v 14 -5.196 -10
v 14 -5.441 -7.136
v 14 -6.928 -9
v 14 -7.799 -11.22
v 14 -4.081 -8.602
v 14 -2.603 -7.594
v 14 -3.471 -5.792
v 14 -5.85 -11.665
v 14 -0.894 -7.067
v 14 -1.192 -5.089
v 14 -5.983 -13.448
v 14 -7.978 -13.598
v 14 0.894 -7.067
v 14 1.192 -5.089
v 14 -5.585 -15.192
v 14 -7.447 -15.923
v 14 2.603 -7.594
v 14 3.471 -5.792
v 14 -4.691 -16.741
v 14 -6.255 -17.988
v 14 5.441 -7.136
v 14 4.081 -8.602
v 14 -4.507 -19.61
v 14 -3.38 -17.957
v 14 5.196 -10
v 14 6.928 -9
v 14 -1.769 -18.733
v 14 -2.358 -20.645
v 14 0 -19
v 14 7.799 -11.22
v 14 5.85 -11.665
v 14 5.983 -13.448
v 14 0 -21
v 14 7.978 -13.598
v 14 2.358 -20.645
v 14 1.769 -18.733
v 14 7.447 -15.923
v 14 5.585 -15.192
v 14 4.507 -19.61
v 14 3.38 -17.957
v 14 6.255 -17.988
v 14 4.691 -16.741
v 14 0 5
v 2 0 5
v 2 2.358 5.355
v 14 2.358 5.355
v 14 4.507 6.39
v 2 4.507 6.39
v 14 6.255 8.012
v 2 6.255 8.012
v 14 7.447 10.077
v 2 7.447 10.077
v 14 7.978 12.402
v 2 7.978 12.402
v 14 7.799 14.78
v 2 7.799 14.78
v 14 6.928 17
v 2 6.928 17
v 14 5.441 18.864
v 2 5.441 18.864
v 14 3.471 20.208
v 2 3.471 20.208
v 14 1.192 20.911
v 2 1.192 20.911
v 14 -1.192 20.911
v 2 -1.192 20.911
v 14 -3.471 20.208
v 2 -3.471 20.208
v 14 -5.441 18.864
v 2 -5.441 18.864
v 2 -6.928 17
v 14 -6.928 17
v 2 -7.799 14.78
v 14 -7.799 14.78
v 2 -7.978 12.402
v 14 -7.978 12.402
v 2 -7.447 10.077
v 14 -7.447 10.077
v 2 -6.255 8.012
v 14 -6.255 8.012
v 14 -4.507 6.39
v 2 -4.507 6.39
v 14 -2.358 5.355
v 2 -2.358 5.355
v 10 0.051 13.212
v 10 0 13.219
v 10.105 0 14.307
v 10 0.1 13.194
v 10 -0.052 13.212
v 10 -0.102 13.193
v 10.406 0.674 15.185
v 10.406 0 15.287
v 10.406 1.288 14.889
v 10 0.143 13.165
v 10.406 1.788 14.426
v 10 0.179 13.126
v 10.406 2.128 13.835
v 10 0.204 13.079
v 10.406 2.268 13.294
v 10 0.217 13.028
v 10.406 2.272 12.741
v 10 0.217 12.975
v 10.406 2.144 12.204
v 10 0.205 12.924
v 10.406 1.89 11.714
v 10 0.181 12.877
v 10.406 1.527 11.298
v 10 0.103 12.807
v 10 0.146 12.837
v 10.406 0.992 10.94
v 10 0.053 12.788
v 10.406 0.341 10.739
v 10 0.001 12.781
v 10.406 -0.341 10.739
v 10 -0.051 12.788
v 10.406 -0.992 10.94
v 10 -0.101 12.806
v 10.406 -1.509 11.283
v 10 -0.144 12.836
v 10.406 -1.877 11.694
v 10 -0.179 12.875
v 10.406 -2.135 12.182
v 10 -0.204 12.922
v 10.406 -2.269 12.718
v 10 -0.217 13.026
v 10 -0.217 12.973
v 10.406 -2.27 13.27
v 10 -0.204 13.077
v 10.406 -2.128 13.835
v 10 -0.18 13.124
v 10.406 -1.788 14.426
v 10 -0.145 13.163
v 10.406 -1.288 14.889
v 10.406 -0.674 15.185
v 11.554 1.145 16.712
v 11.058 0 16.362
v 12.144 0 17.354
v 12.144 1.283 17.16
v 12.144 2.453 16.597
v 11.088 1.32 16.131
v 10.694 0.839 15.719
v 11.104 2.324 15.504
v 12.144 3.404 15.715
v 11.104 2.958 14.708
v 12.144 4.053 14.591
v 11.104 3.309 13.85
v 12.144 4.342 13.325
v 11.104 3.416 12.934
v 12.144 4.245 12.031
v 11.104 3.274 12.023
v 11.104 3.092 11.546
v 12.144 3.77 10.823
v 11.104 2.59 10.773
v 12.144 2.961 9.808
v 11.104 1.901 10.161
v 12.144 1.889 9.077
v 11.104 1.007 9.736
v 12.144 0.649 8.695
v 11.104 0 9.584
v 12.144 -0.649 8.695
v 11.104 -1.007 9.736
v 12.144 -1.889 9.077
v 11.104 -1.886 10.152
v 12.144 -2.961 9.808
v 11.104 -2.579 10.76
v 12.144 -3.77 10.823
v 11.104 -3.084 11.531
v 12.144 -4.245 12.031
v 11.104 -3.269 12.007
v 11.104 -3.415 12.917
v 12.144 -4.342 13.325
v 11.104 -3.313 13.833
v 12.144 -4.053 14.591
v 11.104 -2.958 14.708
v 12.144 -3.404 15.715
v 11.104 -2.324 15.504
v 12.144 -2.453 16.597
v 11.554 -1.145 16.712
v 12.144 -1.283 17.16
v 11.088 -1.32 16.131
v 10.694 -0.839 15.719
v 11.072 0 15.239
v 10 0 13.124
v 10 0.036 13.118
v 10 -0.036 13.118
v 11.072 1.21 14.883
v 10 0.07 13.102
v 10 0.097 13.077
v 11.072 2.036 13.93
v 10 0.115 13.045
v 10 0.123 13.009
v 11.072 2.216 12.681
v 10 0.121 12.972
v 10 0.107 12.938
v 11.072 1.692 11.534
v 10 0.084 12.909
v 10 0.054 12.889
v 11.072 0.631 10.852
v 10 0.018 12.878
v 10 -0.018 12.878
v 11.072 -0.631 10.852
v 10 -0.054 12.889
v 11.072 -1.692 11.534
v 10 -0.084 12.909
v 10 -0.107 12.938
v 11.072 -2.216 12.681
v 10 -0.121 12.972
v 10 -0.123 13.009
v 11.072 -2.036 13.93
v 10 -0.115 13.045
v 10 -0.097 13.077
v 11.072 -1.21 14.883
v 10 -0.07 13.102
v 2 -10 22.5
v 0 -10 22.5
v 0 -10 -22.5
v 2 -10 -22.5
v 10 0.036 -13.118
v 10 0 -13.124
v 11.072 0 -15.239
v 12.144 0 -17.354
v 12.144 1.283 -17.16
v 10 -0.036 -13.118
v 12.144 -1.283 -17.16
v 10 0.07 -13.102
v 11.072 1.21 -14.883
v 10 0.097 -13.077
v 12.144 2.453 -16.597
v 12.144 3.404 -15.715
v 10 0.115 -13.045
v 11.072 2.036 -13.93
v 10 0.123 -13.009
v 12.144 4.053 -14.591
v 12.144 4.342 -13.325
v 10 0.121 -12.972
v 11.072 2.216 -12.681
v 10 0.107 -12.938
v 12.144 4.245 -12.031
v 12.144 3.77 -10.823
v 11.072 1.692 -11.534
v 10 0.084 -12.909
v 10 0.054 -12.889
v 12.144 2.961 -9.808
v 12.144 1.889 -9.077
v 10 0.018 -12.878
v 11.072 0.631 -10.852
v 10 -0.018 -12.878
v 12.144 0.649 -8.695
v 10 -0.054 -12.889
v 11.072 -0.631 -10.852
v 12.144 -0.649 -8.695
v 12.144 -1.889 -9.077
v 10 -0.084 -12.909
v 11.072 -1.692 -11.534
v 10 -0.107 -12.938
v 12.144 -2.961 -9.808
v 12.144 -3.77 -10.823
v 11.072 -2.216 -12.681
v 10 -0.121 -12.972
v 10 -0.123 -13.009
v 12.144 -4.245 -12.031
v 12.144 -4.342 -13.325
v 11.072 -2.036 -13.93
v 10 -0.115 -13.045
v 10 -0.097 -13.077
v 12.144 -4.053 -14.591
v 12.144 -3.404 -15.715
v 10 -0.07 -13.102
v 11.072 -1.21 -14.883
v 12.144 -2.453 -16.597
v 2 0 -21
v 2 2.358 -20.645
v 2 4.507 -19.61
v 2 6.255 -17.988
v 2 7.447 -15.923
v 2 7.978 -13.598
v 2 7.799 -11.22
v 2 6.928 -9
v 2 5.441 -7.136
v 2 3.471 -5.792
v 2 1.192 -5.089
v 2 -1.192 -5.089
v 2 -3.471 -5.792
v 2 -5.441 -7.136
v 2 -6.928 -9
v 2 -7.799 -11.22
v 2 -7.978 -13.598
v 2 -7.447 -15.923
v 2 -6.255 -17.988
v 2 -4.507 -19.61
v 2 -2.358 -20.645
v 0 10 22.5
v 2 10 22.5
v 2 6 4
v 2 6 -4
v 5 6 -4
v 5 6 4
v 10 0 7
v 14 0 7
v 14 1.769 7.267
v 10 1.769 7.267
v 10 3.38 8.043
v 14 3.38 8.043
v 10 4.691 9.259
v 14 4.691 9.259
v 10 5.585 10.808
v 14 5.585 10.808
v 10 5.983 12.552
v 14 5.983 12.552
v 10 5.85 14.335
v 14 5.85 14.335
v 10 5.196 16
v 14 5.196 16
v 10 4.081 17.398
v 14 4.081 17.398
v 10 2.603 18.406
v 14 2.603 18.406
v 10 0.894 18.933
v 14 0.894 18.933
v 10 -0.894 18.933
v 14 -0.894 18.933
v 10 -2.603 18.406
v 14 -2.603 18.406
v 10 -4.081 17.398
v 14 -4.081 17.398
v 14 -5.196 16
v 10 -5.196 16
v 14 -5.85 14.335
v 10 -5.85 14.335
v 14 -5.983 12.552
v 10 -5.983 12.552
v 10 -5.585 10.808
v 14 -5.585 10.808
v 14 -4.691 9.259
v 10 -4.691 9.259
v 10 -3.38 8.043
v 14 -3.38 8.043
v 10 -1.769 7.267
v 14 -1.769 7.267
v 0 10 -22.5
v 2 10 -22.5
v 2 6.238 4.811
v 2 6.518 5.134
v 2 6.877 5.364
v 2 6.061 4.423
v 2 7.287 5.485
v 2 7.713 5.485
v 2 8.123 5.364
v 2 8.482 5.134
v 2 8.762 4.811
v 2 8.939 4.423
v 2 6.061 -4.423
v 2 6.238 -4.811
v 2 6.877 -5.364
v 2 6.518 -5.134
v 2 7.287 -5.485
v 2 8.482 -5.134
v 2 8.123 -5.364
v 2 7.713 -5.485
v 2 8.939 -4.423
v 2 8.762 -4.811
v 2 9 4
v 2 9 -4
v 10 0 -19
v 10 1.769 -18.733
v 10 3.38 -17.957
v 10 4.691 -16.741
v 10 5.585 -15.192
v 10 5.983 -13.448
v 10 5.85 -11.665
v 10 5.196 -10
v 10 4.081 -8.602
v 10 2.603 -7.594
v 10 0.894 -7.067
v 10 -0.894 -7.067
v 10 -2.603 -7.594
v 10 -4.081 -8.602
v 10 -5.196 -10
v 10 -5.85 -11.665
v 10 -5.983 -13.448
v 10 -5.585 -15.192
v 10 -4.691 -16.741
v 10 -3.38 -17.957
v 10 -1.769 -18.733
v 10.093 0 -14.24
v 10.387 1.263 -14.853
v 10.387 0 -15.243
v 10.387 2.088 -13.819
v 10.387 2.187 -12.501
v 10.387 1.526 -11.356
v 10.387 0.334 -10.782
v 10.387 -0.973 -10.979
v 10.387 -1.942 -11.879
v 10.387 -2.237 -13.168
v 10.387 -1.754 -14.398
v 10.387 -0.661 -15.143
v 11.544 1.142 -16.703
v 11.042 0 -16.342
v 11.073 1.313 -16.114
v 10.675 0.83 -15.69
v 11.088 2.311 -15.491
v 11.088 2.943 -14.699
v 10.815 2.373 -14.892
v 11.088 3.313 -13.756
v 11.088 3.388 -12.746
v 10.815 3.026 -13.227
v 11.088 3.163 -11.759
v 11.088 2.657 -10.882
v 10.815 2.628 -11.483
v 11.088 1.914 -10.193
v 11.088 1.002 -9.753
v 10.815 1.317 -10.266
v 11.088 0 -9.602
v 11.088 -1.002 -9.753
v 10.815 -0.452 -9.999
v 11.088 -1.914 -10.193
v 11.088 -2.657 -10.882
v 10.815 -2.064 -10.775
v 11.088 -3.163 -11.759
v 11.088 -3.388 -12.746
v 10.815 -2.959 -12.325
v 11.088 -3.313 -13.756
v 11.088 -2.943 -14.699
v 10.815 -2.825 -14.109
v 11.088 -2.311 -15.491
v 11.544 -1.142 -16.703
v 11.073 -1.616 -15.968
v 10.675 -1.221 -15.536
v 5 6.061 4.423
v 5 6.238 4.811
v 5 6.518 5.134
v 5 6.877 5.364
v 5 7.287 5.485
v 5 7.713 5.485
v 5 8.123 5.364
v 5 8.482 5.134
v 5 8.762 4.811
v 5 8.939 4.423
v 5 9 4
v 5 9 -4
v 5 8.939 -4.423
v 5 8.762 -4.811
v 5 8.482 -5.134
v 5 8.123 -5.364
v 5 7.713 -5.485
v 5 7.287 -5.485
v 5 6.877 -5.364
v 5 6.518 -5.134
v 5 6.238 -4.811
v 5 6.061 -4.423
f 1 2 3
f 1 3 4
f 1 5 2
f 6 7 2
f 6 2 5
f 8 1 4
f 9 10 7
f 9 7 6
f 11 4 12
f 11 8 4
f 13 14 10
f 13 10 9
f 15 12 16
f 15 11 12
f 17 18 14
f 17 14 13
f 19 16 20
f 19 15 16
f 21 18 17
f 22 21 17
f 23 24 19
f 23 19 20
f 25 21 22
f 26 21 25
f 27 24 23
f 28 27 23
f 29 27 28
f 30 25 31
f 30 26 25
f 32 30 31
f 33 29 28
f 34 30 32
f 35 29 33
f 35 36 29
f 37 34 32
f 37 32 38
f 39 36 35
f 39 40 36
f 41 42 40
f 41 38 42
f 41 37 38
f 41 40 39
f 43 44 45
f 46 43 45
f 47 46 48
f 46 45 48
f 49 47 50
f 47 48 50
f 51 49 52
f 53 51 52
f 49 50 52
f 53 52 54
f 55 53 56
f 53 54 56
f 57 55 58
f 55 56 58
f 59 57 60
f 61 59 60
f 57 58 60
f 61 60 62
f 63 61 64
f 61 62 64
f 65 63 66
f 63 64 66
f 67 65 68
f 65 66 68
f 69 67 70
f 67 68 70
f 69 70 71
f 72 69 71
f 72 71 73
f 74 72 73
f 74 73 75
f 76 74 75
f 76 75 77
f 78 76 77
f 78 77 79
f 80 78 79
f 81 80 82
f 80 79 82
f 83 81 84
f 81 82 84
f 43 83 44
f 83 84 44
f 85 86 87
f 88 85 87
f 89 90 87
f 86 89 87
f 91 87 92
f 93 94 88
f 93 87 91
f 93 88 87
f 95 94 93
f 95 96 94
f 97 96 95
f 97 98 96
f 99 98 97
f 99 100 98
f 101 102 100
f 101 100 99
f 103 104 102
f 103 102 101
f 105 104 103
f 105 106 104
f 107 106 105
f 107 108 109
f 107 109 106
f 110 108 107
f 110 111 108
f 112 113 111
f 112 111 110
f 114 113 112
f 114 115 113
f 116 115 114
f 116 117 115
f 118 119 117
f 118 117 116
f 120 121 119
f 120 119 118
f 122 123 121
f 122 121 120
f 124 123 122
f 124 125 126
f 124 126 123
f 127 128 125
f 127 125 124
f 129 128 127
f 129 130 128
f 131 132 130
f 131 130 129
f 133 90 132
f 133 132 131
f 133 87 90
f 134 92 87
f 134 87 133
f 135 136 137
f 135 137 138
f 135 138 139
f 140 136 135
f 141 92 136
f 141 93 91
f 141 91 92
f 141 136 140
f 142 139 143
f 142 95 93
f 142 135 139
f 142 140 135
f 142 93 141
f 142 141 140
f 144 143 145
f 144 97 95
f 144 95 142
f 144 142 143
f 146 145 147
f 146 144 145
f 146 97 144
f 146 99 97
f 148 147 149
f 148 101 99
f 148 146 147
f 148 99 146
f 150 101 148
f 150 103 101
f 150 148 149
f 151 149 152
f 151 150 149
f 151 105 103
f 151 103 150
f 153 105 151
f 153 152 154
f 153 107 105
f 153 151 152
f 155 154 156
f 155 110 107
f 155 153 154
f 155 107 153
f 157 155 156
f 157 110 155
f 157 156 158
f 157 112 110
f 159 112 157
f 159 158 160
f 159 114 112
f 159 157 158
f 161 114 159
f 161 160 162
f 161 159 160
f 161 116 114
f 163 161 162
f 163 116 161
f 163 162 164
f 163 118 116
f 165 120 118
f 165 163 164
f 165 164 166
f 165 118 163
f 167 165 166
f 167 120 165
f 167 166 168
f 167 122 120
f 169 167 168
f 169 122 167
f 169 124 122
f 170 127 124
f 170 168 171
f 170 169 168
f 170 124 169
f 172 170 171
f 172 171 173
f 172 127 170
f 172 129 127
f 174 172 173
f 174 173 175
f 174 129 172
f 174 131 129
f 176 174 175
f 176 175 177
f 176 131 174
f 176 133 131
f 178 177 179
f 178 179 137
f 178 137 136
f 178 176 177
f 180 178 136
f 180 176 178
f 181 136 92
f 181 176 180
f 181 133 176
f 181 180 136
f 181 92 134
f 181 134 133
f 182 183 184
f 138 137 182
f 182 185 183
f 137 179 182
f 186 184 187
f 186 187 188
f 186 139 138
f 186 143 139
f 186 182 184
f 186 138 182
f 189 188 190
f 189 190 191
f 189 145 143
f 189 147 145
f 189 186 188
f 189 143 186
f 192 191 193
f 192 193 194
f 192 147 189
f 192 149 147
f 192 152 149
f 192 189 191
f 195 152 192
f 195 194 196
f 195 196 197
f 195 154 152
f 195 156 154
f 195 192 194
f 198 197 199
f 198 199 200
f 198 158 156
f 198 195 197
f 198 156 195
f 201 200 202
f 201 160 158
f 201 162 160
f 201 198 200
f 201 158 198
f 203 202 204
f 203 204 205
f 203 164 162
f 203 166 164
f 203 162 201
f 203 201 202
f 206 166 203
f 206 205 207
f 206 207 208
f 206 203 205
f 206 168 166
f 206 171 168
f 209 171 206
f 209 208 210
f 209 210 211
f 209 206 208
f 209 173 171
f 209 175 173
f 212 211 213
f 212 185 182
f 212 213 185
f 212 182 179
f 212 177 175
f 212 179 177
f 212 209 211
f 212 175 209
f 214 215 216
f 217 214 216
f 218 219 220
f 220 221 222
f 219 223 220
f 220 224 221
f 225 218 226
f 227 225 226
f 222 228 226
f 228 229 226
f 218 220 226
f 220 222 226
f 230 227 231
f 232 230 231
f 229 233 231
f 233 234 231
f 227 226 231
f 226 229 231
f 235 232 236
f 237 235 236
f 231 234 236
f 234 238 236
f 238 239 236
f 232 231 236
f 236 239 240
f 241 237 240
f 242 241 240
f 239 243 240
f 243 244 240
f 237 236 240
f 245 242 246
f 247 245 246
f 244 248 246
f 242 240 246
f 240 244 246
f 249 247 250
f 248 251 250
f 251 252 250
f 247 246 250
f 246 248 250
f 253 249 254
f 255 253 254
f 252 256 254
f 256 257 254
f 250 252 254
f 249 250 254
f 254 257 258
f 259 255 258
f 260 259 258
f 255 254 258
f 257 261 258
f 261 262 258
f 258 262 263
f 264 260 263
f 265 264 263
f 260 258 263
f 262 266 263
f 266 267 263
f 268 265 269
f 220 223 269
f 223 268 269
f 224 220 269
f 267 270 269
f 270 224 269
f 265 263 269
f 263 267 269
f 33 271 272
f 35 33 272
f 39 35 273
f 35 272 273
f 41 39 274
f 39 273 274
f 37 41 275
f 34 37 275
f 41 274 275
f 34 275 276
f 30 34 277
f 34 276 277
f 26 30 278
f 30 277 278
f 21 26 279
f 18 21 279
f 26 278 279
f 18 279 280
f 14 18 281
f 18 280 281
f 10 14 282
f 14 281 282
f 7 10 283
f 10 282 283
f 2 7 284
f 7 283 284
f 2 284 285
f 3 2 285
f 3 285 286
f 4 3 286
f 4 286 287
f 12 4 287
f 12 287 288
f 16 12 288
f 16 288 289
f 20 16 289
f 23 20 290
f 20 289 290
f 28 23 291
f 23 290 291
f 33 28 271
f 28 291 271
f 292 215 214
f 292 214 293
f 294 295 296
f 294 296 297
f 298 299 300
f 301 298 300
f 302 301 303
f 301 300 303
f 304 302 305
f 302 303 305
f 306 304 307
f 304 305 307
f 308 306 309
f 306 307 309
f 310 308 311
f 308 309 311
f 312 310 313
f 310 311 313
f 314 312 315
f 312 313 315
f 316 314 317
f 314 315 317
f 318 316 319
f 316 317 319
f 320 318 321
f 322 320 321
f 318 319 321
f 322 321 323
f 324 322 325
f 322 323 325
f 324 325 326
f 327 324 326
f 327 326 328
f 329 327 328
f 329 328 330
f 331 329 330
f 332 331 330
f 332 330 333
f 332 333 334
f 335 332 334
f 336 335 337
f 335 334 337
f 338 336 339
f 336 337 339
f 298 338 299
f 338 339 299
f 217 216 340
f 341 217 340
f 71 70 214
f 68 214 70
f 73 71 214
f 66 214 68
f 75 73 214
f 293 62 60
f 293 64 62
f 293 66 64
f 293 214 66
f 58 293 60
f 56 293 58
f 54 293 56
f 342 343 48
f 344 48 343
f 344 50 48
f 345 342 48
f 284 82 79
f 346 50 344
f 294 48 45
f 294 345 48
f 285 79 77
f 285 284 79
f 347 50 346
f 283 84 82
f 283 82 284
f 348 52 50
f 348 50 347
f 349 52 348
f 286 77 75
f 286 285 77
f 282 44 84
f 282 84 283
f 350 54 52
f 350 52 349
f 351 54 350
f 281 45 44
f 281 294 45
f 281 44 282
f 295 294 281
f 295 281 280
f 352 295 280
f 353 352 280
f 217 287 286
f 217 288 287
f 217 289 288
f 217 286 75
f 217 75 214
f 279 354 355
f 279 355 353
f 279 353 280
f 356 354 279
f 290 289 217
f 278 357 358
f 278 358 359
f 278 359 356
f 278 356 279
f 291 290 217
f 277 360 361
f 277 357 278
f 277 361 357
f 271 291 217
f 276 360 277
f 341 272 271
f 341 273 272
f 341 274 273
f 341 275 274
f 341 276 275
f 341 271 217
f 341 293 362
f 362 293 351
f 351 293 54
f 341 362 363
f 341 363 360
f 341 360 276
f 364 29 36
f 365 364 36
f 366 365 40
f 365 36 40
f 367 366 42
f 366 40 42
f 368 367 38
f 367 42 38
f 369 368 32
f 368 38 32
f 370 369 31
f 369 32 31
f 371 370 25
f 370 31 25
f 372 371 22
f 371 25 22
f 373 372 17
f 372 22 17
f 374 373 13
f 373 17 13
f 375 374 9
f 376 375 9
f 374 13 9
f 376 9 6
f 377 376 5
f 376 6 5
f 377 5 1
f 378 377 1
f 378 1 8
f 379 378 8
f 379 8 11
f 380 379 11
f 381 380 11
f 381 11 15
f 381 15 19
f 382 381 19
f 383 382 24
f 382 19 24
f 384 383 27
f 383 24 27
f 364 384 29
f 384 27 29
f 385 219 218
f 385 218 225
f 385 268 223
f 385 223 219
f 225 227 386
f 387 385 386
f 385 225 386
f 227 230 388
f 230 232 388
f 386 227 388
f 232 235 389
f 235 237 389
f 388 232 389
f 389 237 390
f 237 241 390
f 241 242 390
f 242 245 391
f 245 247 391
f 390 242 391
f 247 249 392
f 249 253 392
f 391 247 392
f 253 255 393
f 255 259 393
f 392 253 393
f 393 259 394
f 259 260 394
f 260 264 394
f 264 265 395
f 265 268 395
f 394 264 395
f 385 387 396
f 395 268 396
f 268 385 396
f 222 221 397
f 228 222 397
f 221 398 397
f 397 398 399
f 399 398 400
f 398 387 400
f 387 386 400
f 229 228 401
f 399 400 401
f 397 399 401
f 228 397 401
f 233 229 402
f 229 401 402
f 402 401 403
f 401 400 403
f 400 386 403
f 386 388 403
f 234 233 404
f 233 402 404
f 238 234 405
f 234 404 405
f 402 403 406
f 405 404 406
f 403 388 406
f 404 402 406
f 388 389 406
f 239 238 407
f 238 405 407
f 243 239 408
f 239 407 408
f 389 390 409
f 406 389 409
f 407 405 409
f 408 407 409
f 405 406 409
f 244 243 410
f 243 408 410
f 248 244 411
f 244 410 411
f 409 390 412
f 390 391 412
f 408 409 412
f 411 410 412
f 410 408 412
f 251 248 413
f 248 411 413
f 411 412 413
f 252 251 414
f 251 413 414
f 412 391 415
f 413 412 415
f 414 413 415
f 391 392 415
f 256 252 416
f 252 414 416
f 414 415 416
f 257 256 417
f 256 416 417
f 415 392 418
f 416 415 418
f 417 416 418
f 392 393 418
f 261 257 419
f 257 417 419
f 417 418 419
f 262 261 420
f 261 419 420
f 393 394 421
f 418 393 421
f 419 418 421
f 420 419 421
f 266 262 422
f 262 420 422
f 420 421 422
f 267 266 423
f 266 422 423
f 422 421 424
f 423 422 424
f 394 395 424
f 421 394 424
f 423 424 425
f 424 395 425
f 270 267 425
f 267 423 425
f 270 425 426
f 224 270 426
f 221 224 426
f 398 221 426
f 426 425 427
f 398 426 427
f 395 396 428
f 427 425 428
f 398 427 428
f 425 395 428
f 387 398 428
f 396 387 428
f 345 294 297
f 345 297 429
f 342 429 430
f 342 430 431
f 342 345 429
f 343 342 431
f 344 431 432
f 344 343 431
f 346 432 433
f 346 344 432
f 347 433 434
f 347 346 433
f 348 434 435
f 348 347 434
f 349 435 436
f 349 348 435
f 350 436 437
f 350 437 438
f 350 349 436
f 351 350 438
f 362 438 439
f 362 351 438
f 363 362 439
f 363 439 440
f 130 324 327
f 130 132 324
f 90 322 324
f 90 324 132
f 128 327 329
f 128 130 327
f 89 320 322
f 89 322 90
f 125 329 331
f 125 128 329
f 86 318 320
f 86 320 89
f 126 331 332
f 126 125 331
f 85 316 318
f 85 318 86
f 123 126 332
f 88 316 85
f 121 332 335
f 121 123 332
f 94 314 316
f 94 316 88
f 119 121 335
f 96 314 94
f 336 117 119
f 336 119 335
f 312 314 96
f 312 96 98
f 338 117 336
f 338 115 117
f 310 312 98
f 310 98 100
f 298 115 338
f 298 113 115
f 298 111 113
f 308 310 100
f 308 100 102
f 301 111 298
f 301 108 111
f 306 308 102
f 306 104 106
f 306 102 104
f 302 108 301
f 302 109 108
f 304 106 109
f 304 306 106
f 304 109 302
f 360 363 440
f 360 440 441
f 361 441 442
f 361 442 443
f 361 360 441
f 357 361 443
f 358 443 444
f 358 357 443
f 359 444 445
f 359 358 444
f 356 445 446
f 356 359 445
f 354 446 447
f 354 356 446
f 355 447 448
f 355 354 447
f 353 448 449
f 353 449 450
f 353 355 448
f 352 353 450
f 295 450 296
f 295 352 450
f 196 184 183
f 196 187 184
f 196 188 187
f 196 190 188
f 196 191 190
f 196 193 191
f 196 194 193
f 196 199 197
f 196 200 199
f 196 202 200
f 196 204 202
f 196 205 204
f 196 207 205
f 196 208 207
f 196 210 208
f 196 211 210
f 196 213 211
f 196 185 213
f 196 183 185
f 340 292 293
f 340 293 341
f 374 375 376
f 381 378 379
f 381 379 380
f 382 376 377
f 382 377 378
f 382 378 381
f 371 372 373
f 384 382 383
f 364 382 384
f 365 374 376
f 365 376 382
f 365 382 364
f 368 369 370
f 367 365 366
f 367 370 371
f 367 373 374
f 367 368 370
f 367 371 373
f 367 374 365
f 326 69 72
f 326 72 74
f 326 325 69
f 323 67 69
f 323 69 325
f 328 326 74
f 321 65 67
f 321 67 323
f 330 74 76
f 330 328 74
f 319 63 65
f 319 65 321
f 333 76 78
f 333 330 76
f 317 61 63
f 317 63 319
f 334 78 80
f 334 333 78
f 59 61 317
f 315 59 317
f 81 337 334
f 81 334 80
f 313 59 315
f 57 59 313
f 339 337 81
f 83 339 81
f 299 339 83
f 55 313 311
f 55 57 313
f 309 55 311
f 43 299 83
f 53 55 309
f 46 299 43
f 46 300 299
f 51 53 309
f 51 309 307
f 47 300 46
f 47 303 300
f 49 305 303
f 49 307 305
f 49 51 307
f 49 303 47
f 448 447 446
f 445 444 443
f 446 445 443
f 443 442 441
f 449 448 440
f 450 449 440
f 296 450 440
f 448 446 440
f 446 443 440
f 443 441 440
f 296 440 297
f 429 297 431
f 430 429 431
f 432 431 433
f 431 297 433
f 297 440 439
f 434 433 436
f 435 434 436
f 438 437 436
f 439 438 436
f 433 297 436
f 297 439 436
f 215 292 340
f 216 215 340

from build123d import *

# Parameters (mm, degrees)
SKETCH_1_W          = 45
SKETCH_1_H          = 20
EXTRUDE_1_DEPTH     = 2
EXTRUDE_2_DEPTH     = 3
SKETCH_3_R          = 8
EXTRUDE_3_DEPTH     = 12
SKETCH_4_R          = 6
CUT_EXTRUDE_1_DEPTH = 4


with BuildPart() as part:
    # 草图1 → 凸台-拉伸1 (new body)
    with BuildSketch(Plane(origin=(0, 0, 0), x_dir=(0, 0, -1), z_dir=(1, 0, 0))):
        Rectangle(SKETCH_1_W, SKETCH_1_H)
    extrude(amount=EXTRUDE_1_DEPTH)

    # 草图2 → 凸台-拉伸2 (add)
    with BuildSketch(Plane(origin=(2, 0, 0), x_dir=(0, 0, -1), z_dir=(1, 0, 0))):
        with BuildLine():
            Line((-4, 9), (4, 9))
            ThreePointArc((4, 9), (5.5, 7.5), (4, 6))
            Line((4, 6), (-4, 6))
            ThreePointArc((-4, 6), (-5.5, 7.5), (-4, 9))
        make_face()
    extrude(amount=EXTRUDE_2_DEPTH)

    # 草图3 → 凸台-拉伸3 (add)
    with BuildSketch(Plane(origin=(2, 0, 0), x_dir=(0, 0, -1), z_dir=(1, 0, 0))):
        with Locations((-13, 0)):
            Circle(SKETCH_3_R)
        with Locations((13, 0)):
            Circle(SKETCH_3_R)
    extrude(amount=EXTRUDE_3_DEPTH)

    # 草图4 → 切除-拉伸1 (cut)
    with BuildSketch(Plane(origin=(14, 0, 0), x_dir=(0, 0, -1), z_dir=(1, 0, 0))):
        with Locations((-13, 0)):
            Circle(SKETCH_4_R)
        with Locations((13, 0)):
            Circle(SKETCH_4_R)
    extrude(amount=-CUT_EXTRUDE_1_DEPTH, mode=Mode.SUBTRACT)


with BuildPart() as body_2:
    # 草图5 → 旋转2 (revolve)
    with BuildSketch(Plane(origin=(0, 0, 0), x_dir=(1, 0, 0), z_dir=(0, 1, 0))):
        with BuildLine():
            Line((10, 13.123728158), (12.143734127, 17.35374243))
            add(Edge.make_bspline(
                [(12.143734127, 17.35374243), (9.980962456, 15.851185467), (10, 13.123728158)],
                knots=[0, 0, 0, 1, 1, 1], degree=2))
        make_face()
    revolve_2 = revolve(axis=Axis((10, 0, -13), (1, 0, 0)))


with BuildPart() as part_1:
    add(part.part)

    # 镜向9: 旋转2 across plane
    add(revolve_2.mirror(Plane.XY))


solid = Compound([body_2.part, part_1.part])
